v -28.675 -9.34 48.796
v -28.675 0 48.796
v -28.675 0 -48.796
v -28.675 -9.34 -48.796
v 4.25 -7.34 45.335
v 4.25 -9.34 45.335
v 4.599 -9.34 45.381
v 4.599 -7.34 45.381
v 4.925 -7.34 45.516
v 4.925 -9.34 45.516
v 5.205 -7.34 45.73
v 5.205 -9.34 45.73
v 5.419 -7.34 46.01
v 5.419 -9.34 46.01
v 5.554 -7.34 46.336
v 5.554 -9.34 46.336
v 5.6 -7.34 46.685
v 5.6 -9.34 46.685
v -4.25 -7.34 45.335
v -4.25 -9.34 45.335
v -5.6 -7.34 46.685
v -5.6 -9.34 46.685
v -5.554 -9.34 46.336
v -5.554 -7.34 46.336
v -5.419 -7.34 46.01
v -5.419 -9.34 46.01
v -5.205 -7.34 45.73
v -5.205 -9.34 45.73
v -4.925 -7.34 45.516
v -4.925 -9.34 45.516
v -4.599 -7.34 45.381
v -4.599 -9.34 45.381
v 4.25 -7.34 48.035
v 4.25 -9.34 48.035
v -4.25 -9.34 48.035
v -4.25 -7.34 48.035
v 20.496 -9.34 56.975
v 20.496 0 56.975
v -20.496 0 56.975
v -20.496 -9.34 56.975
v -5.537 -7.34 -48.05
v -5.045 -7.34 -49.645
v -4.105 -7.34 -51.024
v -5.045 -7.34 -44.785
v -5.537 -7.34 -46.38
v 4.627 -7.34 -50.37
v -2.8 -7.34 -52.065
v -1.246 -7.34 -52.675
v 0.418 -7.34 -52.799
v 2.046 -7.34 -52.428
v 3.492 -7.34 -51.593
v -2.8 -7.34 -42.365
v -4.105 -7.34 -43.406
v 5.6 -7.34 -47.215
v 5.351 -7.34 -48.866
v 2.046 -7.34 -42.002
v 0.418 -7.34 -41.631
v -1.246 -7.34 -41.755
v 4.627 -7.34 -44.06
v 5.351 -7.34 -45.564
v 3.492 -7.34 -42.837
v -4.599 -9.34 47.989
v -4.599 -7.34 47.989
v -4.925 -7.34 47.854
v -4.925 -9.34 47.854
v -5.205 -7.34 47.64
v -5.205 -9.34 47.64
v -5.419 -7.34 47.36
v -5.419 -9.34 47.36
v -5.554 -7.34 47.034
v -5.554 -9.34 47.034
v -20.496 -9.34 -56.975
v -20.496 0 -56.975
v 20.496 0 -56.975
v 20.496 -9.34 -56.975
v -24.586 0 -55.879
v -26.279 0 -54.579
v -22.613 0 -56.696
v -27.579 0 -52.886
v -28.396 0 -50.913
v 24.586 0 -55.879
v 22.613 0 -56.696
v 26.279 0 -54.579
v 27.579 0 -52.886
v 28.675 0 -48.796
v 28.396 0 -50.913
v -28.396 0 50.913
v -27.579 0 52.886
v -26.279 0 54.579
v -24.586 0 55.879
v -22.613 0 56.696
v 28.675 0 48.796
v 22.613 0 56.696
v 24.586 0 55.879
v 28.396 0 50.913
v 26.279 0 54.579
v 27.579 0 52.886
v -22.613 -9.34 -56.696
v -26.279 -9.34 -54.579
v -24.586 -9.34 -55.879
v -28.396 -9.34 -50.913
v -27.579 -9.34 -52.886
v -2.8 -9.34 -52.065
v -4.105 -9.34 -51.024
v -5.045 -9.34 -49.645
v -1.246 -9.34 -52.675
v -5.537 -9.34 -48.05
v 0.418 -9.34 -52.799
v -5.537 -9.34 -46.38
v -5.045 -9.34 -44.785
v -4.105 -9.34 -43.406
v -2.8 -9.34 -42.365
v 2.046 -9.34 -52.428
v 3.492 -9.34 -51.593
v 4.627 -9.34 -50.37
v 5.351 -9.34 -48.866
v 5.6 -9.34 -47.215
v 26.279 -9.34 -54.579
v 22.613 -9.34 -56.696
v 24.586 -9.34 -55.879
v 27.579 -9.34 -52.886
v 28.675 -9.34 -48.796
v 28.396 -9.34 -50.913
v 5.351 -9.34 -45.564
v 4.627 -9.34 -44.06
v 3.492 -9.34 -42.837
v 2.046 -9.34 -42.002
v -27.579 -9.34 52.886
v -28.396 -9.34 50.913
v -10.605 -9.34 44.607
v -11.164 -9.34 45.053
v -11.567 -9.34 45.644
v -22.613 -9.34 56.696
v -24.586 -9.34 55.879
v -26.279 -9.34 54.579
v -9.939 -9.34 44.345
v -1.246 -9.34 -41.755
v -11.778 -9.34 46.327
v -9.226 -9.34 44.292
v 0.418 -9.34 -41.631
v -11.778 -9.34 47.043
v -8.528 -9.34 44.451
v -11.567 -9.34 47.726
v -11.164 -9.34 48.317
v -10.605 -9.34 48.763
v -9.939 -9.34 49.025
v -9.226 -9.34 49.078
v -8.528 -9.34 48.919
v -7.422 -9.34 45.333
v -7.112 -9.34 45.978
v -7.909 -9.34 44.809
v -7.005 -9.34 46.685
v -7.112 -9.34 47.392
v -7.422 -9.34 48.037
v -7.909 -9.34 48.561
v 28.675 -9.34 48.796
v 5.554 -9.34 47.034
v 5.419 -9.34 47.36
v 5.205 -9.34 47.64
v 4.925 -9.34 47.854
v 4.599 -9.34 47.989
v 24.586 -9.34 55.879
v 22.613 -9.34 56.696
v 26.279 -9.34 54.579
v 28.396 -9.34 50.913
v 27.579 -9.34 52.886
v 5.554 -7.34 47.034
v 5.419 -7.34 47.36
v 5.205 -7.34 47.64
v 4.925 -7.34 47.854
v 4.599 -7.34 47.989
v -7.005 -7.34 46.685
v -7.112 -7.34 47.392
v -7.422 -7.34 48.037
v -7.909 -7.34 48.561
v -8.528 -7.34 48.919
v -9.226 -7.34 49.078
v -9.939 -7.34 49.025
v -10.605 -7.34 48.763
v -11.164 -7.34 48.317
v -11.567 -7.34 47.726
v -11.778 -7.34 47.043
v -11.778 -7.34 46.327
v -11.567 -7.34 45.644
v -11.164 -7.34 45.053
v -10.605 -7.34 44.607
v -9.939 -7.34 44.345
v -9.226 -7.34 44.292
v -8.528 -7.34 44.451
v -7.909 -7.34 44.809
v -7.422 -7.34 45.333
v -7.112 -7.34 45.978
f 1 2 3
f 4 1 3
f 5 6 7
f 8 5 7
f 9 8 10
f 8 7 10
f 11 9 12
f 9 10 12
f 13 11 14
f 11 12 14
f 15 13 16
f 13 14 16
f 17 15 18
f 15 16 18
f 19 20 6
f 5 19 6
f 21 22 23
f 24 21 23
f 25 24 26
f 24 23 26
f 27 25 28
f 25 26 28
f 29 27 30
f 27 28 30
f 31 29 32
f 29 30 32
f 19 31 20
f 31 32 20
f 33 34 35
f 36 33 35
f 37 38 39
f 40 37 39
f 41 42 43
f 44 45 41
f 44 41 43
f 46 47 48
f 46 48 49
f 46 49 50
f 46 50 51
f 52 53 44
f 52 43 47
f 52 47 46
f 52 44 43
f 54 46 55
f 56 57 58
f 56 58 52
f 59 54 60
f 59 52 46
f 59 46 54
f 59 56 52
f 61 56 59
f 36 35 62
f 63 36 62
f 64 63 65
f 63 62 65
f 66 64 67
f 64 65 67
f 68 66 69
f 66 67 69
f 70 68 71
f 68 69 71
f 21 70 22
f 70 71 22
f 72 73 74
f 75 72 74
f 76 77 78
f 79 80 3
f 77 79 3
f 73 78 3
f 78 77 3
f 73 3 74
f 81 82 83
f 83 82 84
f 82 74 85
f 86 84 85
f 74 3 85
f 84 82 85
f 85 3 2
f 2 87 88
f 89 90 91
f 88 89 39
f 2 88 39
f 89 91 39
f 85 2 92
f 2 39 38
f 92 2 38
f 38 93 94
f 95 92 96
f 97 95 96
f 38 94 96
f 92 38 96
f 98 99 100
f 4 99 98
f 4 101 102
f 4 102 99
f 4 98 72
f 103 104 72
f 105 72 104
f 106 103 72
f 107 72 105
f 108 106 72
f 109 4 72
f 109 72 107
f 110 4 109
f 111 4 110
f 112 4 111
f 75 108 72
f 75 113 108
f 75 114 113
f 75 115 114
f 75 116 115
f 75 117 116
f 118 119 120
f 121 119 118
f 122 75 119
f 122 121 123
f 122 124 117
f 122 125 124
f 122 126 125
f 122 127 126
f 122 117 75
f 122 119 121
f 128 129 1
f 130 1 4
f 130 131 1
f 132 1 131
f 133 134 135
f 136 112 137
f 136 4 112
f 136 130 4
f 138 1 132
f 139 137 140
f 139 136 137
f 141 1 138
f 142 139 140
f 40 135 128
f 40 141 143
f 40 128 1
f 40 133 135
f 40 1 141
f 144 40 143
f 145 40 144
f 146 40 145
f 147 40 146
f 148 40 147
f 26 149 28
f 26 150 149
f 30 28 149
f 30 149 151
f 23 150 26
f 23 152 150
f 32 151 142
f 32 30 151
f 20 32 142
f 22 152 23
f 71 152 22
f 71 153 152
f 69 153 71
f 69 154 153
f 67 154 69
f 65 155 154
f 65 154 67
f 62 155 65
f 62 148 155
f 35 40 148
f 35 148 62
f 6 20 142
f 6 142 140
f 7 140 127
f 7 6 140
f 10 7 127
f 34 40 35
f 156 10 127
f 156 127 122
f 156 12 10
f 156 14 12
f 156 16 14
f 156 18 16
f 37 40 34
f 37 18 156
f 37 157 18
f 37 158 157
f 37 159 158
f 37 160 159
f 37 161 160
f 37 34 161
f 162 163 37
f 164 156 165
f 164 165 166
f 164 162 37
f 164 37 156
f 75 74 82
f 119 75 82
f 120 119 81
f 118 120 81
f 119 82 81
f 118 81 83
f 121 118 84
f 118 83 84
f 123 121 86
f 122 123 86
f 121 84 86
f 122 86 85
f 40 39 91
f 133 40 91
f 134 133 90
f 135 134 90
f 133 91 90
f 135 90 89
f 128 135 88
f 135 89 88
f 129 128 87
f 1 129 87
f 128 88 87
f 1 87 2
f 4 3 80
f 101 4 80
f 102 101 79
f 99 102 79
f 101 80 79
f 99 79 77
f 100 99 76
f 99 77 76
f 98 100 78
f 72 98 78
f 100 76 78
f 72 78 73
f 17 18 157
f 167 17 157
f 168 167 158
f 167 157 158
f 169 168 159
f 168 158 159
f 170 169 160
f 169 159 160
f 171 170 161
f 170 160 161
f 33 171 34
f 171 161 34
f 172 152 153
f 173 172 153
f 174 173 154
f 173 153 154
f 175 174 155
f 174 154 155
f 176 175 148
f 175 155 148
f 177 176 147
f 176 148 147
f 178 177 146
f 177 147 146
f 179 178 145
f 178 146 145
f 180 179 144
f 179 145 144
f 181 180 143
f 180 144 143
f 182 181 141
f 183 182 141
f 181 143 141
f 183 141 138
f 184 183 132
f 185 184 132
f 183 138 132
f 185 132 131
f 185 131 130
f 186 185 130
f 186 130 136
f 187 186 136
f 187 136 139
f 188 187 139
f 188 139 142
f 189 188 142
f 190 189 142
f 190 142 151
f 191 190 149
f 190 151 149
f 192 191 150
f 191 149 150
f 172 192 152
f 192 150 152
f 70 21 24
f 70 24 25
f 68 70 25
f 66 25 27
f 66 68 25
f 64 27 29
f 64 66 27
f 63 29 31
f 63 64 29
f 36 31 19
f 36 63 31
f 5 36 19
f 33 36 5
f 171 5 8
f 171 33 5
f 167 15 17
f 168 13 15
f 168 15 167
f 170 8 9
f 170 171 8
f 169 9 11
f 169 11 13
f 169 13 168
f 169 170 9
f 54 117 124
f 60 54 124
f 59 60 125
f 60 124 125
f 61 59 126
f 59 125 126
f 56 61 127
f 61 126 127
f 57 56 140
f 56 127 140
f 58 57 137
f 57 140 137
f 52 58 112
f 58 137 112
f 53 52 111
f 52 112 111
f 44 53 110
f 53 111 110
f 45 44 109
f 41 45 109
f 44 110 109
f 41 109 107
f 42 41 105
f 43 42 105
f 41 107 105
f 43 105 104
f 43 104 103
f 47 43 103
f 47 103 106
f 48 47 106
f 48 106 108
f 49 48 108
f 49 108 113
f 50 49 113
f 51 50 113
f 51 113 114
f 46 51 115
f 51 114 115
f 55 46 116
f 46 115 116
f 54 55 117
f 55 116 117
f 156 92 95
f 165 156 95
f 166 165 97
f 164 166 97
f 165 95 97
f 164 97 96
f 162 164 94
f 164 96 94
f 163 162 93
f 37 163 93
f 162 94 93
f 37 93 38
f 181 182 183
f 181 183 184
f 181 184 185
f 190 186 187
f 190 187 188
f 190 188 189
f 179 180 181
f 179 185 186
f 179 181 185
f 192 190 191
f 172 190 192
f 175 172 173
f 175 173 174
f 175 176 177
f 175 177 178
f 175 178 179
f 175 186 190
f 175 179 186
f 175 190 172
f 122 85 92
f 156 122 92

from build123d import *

# Parameters (mm, degrees)
F1_DEPTH = 9.34
F2_R     = 2.4
F2_R_2   = 5.6
F3_DEPTH = 2


with BuildPart() as f1:
    # F0 (on Front) → F1 (new body)
    with BuildSketch(Plane.XZ):
        with BuildLine():
            ThreePointArc((28.675, 48.7962), (26.279485, 54.579485), (20.4962, 56.975))
            Line((20.4962, 56.975), (-20.4962, 56.975))
            ThreePointArc((-20.4962, 56.975), (-26.279485, 54.579485), (-28.675, 48.7962))
            Line((-28.675, 48.7962), (-28.675, -48.7962))
            ThreePointArc((-28.675, -48.7962), (-26.279485, -54.579485), (-20.4962, -56.975))
            Line((-20.4962, -56.975), (20.4962, -56.975))
            ThreePointArc((20.4962, -56.975), (26.279485, -54.579485), (28.675, -48.7962))
            Line((28.675, -48.7962), (28.675, 48.7962))
        make_face()
    extrude(amount=F1_DEPTH)

    # F2 (on face) → F3 (cut)
    with BuildSketch(Plane.XZ.offset(9.34)):
        with Locations((-9.405, 46.685)):
            Circle(F2_R)
        with BuildLine():
            Line((-4.25, 45.335), (4.25, 45.335))
            ThreePointArc((4.25, 45.335), (5.204594, 45.730406), (5.6, 46.685))
            ThreePointArc((5.6, 46.685), (5.204594, 47.639594), (4.25, 48.035))
            Line((4.25, 48.035), (-4.25, 48.035))
            ThreePointArc((-4.25, 48.035), (-5.204594, 47.639594), (-5.6, 46.685))
            ThreePointArc((-5.6, 46.685), (-5.204594, 45.730406), (-4.25, 45.335))
        make_face()
        with Locations((0, -47.215)):
            Circle(F2_R_2)
    extrude(amount=-F3_DEPTH, mode=Mode.SUBTRACT)


solid = f1.part
